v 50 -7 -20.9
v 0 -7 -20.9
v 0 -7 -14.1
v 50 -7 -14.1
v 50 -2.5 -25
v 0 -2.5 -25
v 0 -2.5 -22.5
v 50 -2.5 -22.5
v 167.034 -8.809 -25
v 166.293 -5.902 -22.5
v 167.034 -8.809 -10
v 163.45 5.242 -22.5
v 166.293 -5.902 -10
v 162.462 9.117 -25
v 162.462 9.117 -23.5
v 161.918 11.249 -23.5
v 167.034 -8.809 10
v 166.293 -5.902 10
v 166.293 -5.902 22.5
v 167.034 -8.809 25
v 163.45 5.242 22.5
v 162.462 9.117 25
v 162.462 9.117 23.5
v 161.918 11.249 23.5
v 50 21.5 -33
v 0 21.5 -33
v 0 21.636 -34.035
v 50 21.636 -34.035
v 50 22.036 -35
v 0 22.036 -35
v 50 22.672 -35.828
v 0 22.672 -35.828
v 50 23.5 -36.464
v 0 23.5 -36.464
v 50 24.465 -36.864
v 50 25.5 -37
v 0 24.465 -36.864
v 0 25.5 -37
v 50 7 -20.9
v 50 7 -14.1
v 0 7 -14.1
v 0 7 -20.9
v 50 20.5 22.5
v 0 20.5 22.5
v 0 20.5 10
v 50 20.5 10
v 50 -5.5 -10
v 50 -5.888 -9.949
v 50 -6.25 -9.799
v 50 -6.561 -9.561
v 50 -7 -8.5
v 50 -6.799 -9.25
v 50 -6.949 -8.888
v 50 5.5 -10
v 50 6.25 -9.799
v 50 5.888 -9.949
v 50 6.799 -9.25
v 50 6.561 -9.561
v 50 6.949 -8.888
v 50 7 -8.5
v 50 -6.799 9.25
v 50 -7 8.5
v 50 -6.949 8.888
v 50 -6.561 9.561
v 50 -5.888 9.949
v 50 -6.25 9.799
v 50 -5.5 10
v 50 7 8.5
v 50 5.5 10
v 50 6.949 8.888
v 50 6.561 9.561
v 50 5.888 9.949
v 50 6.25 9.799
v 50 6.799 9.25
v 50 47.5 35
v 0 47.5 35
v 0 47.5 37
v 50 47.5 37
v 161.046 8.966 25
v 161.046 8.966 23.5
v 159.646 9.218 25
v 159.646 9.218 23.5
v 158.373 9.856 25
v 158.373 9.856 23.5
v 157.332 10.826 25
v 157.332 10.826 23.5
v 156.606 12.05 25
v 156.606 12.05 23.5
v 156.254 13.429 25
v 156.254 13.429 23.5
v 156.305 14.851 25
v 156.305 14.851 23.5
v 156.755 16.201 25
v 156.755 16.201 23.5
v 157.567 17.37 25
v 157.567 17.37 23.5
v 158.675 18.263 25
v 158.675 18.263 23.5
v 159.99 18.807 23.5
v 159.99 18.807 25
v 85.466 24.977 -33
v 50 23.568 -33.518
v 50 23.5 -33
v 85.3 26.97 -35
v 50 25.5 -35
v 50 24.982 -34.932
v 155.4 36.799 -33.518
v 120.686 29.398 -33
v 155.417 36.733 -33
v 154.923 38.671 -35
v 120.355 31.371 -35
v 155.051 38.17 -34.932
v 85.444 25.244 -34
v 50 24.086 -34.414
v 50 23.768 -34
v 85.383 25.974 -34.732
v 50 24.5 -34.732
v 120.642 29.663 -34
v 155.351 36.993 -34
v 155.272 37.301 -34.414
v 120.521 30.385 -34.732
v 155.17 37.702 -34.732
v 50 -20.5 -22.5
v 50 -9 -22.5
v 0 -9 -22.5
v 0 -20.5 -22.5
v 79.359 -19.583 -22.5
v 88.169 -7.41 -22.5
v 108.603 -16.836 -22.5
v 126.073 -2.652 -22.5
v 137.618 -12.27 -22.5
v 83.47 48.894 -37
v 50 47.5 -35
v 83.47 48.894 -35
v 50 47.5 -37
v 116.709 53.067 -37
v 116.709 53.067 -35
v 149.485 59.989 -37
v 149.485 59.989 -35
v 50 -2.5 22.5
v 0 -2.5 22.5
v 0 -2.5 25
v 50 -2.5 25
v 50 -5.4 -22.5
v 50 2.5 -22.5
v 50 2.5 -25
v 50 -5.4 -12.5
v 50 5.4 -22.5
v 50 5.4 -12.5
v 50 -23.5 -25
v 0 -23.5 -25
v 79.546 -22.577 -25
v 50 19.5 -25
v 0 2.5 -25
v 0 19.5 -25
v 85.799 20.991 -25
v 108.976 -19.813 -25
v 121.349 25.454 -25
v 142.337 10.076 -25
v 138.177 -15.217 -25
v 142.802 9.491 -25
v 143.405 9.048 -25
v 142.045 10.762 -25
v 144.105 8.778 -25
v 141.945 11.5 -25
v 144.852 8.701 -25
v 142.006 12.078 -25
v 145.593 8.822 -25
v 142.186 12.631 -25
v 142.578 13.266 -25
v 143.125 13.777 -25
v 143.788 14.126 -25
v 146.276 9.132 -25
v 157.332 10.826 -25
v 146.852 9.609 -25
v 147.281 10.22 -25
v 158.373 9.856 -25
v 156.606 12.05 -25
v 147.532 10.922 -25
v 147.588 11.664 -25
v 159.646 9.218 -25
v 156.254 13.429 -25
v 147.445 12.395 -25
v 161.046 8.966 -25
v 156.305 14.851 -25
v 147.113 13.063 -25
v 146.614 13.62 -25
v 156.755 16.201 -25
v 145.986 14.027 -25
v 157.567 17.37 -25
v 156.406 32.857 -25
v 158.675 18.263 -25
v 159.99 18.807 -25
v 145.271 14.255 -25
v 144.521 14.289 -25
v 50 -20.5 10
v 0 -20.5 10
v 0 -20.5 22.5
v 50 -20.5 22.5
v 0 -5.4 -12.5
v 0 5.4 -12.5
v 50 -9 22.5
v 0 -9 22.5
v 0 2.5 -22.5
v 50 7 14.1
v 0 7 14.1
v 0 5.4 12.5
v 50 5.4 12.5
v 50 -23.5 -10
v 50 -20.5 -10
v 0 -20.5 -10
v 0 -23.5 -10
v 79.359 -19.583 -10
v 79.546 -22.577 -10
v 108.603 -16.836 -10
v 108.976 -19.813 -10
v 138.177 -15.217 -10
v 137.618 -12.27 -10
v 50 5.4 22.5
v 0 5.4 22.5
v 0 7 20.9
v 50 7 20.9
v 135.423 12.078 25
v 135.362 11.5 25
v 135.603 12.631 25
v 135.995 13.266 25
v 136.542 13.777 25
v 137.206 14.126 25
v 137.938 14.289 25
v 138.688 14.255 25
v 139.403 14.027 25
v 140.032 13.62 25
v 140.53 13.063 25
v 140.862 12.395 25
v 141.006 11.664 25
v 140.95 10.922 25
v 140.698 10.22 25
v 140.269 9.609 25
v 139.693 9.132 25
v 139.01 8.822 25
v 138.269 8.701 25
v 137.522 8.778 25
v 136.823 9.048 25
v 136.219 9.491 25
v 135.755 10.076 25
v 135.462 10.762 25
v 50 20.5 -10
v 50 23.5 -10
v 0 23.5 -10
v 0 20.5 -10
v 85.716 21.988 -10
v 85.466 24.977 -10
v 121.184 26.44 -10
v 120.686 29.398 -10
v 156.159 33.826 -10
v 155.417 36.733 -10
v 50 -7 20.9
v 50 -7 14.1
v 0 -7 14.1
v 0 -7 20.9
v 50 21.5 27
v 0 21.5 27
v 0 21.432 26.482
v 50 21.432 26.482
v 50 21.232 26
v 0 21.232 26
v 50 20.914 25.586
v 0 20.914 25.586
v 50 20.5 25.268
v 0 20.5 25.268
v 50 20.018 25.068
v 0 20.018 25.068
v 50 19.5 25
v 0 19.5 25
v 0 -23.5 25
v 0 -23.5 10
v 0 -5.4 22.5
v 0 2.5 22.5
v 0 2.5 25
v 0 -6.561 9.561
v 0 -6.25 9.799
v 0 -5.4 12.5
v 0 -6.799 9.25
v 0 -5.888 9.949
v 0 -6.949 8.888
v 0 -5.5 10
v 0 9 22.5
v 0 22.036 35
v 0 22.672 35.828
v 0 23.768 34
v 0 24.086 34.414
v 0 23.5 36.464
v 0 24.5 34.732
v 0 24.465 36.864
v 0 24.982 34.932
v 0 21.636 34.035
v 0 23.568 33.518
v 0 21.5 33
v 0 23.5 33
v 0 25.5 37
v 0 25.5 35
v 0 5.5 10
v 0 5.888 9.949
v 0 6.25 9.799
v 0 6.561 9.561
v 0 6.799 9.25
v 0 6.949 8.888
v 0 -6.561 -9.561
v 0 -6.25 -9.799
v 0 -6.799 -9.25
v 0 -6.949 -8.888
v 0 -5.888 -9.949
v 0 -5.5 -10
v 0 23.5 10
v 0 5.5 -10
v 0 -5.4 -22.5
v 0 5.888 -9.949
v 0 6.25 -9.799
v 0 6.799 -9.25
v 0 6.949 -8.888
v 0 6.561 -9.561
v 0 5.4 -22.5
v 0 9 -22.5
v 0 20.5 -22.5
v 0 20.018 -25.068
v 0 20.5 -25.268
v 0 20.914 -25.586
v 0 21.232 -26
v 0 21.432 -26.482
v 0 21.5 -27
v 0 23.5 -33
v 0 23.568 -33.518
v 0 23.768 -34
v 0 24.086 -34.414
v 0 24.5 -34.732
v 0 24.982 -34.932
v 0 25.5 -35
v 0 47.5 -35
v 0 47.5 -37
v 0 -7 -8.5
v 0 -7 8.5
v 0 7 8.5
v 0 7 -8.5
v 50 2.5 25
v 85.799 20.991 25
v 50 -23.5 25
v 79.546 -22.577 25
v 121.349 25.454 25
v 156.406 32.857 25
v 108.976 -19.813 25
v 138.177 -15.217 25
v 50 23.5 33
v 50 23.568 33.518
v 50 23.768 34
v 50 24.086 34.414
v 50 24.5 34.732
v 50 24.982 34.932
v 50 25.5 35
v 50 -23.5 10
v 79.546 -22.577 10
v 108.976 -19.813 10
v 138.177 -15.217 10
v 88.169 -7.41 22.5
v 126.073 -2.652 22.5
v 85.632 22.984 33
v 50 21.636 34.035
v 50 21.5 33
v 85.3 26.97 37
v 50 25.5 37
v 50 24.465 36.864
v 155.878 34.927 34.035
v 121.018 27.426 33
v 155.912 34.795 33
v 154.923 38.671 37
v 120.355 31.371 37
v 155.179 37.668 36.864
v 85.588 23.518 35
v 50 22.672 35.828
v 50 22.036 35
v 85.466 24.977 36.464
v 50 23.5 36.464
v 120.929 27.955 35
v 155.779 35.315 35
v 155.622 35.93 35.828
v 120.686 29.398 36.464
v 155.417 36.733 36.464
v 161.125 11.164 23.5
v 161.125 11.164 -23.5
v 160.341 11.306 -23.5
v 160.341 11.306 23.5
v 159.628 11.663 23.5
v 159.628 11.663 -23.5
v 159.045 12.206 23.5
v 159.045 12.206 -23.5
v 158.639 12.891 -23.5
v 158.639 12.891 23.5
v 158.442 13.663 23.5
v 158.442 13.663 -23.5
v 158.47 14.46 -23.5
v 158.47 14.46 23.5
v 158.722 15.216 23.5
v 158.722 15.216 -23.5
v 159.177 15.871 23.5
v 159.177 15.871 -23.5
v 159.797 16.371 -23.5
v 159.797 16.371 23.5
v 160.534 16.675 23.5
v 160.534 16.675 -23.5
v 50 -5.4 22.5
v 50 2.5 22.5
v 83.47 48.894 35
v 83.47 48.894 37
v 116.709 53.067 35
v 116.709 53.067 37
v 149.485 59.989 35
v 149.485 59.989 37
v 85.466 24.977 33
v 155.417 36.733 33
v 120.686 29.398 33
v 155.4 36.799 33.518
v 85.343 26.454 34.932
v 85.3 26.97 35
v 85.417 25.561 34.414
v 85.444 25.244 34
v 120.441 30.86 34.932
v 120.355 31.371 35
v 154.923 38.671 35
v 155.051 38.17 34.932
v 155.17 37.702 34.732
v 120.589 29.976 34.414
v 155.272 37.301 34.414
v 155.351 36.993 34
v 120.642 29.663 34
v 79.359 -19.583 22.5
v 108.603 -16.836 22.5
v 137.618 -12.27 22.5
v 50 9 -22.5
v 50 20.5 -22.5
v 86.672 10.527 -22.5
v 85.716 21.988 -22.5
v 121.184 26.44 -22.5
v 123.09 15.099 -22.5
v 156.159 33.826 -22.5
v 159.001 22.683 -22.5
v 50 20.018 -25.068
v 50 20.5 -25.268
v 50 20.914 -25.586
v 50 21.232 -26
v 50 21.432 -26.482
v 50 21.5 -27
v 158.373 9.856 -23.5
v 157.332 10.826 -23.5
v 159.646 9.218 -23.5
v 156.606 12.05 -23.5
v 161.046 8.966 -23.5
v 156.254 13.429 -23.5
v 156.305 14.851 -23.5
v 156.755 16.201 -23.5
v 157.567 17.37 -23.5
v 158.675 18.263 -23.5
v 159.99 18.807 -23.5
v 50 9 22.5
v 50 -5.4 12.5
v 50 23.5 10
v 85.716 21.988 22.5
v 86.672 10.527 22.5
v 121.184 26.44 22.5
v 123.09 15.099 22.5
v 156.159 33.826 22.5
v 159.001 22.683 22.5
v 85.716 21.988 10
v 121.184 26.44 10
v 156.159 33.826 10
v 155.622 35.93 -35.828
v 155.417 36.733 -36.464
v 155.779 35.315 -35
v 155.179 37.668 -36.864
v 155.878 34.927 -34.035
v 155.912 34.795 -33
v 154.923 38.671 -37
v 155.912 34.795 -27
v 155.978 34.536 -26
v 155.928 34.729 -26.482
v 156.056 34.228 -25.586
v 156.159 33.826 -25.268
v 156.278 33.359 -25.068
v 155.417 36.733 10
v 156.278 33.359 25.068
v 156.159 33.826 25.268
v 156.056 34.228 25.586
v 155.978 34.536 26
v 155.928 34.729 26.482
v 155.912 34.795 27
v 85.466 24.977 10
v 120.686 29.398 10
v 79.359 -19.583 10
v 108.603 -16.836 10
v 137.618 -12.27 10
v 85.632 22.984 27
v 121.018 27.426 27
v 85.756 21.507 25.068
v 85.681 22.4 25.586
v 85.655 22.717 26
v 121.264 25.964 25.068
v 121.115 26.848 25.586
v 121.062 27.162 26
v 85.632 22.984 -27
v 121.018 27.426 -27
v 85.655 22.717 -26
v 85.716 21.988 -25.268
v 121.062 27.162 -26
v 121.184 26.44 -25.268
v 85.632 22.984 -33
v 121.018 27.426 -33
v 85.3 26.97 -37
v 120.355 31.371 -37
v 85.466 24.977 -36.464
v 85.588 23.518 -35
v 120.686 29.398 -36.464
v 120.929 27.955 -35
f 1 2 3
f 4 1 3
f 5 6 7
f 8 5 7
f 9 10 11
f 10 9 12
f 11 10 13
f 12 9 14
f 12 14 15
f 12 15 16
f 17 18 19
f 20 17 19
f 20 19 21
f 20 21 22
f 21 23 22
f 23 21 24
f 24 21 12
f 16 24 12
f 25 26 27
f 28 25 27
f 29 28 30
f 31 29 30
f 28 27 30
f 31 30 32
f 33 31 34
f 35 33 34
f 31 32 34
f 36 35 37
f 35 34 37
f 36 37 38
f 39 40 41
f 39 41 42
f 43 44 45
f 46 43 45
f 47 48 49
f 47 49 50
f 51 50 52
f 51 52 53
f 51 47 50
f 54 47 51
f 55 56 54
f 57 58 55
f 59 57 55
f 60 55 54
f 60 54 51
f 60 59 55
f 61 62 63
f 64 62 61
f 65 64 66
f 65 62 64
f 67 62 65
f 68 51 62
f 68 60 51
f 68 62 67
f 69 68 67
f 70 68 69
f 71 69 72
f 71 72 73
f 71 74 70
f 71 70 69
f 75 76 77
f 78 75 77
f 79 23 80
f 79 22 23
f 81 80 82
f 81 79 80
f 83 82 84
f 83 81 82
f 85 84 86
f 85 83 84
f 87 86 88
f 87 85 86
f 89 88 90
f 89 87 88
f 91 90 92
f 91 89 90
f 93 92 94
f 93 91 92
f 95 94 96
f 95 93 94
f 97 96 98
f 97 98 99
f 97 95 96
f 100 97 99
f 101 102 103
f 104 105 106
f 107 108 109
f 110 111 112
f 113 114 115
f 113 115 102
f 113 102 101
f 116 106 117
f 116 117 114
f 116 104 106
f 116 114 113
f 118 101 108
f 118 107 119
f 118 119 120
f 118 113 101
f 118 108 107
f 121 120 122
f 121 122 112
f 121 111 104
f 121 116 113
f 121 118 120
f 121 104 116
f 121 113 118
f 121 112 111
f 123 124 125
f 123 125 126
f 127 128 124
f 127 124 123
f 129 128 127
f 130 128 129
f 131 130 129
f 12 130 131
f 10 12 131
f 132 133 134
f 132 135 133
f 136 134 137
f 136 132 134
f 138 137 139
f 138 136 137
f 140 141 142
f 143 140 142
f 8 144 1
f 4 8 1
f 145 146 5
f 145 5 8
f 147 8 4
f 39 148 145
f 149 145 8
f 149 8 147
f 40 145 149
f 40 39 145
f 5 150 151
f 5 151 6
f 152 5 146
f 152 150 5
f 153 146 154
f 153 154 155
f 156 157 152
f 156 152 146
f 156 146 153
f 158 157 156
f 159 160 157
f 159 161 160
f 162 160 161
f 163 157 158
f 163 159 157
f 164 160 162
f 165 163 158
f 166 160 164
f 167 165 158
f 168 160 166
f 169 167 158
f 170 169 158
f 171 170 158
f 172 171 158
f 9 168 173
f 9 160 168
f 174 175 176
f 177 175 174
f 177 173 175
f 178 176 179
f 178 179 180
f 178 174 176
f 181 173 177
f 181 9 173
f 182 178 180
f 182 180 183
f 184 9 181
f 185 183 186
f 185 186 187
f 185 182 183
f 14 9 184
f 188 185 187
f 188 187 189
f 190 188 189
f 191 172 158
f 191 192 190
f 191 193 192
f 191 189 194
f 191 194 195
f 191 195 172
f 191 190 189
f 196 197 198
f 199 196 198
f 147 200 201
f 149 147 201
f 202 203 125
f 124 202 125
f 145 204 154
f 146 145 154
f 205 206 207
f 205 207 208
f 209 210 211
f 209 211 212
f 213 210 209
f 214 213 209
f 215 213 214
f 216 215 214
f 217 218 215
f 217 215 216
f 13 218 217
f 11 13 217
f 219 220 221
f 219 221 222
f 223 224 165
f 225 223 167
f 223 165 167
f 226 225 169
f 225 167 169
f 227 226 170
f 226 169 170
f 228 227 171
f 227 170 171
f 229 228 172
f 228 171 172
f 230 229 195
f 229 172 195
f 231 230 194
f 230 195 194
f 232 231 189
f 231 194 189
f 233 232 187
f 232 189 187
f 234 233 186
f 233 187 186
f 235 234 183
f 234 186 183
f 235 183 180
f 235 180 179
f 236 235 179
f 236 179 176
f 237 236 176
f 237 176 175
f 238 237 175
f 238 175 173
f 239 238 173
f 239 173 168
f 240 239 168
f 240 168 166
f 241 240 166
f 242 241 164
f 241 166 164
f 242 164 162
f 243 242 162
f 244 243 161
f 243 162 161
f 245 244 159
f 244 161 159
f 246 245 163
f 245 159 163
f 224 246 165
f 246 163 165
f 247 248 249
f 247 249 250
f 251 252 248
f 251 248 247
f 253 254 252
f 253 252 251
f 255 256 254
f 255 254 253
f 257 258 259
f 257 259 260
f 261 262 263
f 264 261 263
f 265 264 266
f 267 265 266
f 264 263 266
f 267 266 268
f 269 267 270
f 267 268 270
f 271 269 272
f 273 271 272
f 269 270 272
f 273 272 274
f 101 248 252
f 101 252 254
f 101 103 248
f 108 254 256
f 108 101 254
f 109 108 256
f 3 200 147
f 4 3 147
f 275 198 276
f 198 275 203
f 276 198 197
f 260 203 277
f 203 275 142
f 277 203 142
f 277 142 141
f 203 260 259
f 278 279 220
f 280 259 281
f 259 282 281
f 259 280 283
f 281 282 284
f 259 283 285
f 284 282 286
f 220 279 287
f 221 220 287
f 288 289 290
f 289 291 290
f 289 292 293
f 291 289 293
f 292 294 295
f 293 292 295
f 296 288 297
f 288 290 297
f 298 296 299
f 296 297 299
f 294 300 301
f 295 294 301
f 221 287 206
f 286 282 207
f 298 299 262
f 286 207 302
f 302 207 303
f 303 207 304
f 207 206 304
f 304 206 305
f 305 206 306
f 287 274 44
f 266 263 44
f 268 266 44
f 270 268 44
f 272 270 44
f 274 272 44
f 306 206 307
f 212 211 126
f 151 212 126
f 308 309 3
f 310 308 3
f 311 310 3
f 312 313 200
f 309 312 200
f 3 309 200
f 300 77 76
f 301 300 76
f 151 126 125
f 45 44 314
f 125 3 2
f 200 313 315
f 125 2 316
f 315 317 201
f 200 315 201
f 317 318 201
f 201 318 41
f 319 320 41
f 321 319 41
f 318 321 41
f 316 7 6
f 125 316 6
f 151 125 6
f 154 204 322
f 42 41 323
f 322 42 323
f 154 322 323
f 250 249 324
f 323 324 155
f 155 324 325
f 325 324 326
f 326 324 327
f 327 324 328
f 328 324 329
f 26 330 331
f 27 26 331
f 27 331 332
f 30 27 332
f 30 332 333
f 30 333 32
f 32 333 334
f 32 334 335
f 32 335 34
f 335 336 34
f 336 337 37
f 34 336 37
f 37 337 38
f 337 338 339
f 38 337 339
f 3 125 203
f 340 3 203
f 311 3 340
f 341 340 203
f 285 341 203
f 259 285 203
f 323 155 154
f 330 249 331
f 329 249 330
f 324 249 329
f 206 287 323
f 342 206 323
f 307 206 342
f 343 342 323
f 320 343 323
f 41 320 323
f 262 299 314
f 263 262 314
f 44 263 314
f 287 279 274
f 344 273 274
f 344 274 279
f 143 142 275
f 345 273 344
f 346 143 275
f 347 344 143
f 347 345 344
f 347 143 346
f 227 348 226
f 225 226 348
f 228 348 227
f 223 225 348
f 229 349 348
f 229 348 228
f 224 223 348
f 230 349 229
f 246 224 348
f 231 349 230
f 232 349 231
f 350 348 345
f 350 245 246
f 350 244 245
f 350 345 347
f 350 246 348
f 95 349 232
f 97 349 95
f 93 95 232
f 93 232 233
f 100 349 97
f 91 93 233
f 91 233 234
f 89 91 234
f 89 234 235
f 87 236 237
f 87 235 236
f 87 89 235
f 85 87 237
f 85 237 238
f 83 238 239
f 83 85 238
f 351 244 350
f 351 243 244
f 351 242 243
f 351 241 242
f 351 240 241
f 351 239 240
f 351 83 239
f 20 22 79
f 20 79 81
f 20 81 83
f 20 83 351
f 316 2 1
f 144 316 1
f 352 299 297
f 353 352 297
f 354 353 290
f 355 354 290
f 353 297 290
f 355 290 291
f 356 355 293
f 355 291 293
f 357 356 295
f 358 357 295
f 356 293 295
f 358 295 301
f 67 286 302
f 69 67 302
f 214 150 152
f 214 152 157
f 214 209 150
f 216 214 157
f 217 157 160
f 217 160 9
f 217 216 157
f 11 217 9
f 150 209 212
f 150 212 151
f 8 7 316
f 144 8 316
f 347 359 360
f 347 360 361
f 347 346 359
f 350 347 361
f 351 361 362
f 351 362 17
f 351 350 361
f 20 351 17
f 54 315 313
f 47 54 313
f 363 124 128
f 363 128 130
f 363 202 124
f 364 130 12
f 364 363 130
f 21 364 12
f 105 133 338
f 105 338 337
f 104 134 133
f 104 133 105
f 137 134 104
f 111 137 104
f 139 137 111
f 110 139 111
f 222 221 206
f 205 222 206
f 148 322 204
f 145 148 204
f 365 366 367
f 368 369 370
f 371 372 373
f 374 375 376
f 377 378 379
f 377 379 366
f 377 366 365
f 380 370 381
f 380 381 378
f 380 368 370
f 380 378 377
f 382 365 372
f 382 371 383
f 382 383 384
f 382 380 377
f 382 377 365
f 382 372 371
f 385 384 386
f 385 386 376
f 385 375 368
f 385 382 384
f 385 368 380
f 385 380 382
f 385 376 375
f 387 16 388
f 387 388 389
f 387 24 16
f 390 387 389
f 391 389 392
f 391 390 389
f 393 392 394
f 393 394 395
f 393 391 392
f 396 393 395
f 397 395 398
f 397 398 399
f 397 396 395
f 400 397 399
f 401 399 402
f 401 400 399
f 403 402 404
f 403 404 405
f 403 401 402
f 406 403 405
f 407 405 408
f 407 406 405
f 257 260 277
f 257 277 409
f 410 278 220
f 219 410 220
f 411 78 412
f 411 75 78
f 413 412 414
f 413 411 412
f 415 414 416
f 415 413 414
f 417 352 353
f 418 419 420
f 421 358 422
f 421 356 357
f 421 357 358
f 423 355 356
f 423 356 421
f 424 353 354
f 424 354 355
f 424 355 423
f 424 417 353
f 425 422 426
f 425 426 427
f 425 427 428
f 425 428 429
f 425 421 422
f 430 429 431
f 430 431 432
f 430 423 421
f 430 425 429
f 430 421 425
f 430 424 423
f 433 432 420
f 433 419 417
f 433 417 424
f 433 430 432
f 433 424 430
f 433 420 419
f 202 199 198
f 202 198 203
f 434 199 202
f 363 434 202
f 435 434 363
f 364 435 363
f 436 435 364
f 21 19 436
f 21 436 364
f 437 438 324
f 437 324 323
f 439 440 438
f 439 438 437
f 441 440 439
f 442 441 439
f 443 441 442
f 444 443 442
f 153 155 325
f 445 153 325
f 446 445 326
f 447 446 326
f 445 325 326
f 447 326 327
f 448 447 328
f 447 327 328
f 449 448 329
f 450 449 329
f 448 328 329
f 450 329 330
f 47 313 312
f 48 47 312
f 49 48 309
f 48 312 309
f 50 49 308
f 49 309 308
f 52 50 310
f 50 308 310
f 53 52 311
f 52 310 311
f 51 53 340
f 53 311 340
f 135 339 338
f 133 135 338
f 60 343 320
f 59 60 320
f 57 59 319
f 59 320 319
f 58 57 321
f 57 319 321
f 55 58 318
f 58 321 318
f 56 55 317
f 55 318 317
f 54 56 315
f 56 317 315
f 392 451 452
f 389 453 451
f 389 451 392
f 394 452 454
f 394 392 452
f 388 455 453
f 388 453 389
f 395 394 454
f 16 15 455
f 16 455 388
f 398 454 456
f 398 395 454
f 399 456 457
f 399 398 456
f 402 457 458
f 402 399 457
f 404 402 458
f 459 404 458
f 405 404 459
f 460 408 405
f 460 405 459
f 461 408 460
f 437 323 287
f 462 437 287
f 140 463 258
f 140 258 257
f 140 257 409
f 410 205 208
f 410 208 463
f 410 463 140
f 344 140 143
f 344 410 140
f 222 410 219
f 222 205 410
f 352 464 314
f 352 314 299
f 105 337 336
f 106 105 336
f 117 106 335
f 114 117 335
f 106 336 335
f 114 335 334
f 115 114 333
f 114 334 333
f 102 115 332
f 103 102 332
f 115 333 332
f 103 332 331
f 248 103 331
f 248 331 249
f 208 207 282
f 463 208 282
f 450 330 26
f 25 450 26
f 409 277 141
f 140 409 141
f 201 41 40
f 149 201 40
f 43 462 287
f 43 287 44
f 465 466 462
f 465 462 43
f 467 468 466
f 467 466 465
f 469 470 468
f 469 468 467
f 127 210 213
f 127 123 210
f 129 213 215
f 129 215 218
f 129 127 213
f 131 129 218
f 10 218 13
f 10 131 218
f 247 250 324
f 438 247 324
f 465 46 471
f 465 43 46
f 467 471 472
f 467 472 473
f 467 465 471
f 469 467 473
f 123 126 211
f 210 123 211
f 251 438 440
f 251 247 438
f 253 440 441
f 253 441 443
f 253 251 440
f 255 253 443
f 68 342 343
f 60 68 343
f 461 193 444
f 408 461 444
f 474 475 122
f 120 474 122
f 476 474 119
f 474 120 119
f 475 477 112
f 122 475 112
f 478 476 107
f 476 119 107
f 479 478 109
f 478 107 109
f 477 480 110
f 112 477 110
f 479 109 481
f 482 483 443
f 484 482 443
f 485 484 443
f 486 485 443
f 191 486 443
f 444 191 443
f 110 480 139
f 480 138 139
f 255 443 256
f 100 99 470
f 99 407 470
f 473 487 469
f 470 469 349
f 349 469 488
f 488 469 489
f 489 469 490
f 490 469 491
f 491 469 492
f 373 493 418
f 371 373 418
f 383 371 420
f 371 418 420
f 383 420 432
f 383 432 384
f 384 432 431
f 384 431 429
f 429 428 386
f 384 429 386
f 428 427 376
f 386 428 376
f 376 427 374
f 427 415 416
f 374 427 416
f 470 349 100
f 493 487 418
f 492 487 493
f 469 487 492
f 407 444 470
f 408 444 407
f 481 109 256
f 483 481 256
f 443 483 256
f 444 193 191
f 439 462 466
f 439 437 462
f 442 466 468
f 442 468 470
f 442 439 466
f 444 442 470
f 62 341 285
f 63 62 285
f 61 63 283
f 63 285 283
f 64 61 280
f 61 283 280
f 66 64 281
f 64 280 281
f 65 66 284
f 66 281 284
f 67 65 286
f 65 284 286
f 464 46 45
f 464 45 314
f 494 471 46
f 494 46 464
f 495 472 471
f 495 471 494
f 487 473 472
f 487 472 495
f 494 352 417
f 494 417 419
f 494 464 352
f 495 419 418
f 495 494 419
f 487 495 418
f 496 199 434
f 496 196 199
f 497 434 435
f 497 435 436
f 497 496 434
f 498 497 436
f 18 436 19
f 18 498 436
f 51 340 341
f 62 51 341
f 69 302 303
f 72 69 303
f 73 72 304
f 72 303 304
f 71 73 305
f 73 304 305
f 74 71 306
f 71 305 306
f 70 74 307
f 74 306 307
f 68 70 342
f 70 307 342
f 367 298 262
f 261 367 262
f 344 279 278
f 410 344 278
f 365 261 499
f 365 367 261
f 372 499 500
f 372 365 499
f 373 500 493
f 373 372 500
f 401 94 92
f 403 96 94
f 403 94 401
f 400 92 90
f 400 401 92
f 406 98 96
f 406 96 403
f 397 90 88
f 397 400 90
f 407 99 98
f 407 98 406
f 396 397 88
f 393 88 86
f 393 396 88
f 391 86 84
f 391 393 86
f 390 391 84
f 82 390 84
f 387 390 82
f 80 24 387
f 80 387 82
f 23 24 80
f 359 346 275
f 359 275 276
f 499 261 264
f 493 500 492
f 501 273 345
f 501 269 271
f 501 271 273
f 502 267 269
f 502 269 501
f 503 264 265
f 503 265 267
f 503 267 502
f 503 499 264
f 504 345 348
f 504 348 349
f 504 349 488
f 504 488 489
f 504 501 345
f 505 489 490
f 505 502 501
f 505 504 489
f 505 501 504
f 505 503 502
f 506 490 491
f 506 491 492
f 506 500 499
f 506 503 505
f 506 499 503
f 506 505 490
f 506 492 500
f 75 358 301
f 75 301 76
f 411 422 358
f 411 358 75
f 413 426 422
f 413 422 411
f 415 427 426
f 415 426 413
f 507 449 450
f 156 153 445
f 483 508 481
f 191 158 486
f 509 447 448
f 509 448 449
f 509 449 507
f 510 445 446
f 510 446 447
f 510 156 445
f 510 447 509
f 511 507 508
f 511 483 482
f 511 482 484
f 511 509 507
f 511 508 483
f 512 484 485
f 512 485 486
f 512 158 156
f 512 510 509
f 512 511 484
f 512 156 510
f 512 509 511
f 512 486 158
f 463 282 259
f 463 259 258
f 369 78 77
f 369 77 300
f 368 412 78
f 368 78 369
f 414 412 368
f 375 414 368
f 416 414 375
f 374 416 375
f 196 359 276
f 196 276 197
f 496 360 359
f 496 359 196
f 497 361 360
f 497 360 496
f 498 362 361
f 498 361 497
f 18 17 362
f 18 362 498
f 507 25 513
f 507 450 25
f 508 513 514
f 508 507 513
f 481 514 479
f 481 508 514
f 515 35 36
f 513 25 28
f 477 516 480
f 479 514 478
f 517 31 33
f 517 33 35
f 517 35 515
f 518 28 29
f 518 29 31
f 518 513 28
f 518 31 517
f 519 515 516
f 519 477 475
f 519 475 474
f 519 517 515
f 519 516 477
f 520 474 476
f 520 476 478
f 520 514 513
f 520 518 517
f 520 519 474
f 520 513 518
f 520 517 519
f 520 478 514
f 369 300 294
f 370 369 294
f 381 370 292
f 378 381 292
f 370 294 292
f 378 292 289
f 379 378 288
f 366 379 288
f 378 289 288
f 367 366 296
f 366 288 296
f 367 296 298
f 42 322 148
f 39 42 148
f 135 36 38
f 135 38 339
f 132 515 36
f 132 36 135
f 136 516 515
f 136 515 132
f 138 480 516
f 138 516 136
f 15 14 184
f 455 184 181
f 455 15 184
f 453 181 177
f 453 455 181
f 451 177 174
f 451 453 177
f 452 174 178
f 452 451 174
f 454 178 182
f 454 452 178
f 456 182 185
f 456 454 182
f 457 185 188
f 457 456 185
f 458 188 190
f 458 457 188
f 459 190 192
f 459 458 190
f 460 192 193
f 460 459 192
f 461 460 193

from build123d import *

# Parameters (mm, degrees)
ESTRUSIONE_ESTRUSIONE1_DEPTH = 50
SMUSSO1_SIZE                 = 1.6
RIVOLUZIONE1_ANGLE           = 14.31
FORO_PER_VITE_M5_2_D         = 5.6
FORO_PER_VITE_M5_2_DEPTH     = 120
FORO_PER_VITE_M5_2_TIP       = 1.682409733


with BuildPart() as part:
    # Schizzo1 → Estrusione-Estrusione1 (new body)
    with BuildSketch(Plane(origin=(0, 0, 0), x_dir=(0, 0, -1), z_dir=(1, 0, 0))):
        with BuildLine():
            Line((-10, -23.5), (-10, -20.5))
            Line((-10, -20.5), (-22.5, -20.5))
            Line((-22.5, -20.5), (-22.5, -9))
            Line((-22.5, -9), (22.5, -9))
            Line((22.5, -9), (22.5, -20.5))
            Line((22.5, -20.5), (10, -20.5))
            Line((10, -20.5), (10, -23.5))
            Line((10, -23.5), (25, -23.5))
            Line((25, -23.5), (25, -2.5))
            Line((25, -2.5), (22.5, -2.5))
            Line((22.5, -2.5), (22.5, -7))
            Line((22.5, -7), (12.5, -7))
            Line((12.5, -7), (12.5, 7))
            Line((12.5, 7), (22.5, 7))
            Line((22.5, 7), (22.5, 2.5))
            Line((22.5, 2.5), (25, 2.5))
            Line((25, 2.5), (25, 19.5))
            ThreePointArc((25, 19.5), (25.585786438, 20.914213562), (27, 21.5))
            Line((27, 21.5), (33, 21.5))
            ThreePointArc((33, 21.5), (35.828427125, 22.671572875), (37, 25.5))
            Line((37, 25.5), (37, 47.5))
            Line((37, 47.5), (35, 47.5))
            Line((35, 47.5), (35, 25.5))
            ThreePointArc((35, 25.5), (34.414213562, 24.085786438), (33, 23.5))
            Line((33, 23.5), (10, 23.5))
            Line((10, 23.5), (10, 20.5))
            Line((10, 20.5), (22.5, 20.5))
            Line((22.5, 20.5), (22.5, 9))
            Line((22.5, 9), (-22.5, 9))
            Line((-22.5, 9), (-22.5, 20.5))
            Line((-22.5, 20.5), (-10, 20.5))
            Line((-10, 20.5), (-10, 23.5))
            Line((-10, 23.5), (-33, 23.5))
            ThreePointArc((-33, 23.5), (-34.414213562, 24.085786438), (-35, 25.5))
            Line((-35, 25.5), (-35, 47.5))
            Line((-35, 47.5), (-37, 47.5))
            Line((-37, 47.5), (-37, 25.5))
            ThreePointArc((-37, 25.5), (-35.828427125, 22.671572875), (-33, 21.5))
            Line((-33, 21.5), (-27, 21.5))
            ThreePointArc((-27, 21.5), (-25.585786438, 20.914213562), (-25, 19.5))
            Line((-25, 19.5), (-25, 2.5))
            Line((-25, 2.5), (-22.5, 2.5))
            Line((-22.5, 2.5), (-22.5, 7))
            Line((-22.5, 7), (-12.5, 7))
            Line((-12.5, 7), (-12.5, -7))
            Line((-12.5, -7), (-22.5, -7))
            Line((-22.5, -7), (-22.5, -2.5))
            Line((-22.5, -2.5), (-25, -2.5))
            Line((-25, -2.5), (-25, -23.5))
            Line((-25, -23.5), (-10, -23.5))
        make_face()
        with BuildLine():
            Line((-8.5, 7), (8.5, 7))
            ThreePointArc((8.5, 7), (9.560660172, 6.560660172), (10, 5.5))
            Line((10, 5.5), (10, -5.5))
            ThreePointArc((10, -5.5), (9.560660172, -6.560660172), (8.5, -7))
            Line((8.5, -7), (-8.5, -7))
            ThreePointArc((-8.5, -7), (-9.560660172, -6.560660172), (-10, -5.5))
            Line((-10, -5.5), (-10, 5.5))
            ThreePointArc((-10, 5.5), (-9.560660172, 6.560660172), (-8.5, 7))
        make_face(mode=Mode.SUBTRACT)
    extrude(amount=ESTRUSIONE_ESTRUSIONE1_DEPTH)

    # Smusso1
    smusso1_edges = [part.edges().sort_by_distance(p)[0] for p in [
        (25, -7, 22.5),
        (25, -7, 12.5),
        (25, 7, 12.5),
        (25, 7, 22.5),
        (25, 7, -22.5),
        (25, 7, -12.5),
        (25, -7, -12.5),
        (25, -7, -22.5),
    ]]
    chamfer(smusso1_edges, length=SMUSSO1_SIZE)

    # Schizzo2 → Rivoluzione1 (revolve)
    with BuildSketch(Plane(origin=(50, 0, 0), x_dir=(0, 0, -1), z_dir=(1, 0, 0))):
        with BuildLine():
            Line((-10, -23.5), (-25, -23.5))
            Line((-25, -23.5), (-25, 19.5))
            ThreePointArc((-25, 19.5), (-25.585786438, 20.914213562), (-27, 21.5))
            Line((-27, 21.5), (-33, 21.5))
            ThreePointArc((-33, 21.5), (-35.828427125, 22.671572875), (-37, 25.5))
            Line((-37, 25.5), (-37, 47.5))
            Line((-37, 47.5), (-35, 47.5))
            Line((-35, 47.5), (-35, 25.5))
            ThreePointArc((-35, 25.5), (-34.414213562, 24.085786438), (-33, 23.5))
            Line((-33, 23.5), (-10, 23.5))
            Line((-10, 23.5), (-10, 20.5))
            Line((-10, 20.5), (-22.5, 20.5))
            Line((-22.5, 20.5), (-22.5, 9))
            Line((-22.5, 9), (22.5, 9))
            Line((22.5, 9), (22.5, 20.5))
            Line((22.5, 20.5), (10, 20.5))
            Line((10, 20.5), (10, 23.5))
            Line((10, 23.5), (33, 23.5))
            ThreePointArc((33, 23.5), (34.414213562, 24.085786438), (35, 25.5))
            Line((35, 25.5), (35, 47.5))
            Line((35, 47.5), (37, 47.5))
            Line((37, 47.5), (37, 25.5))
            ThreePointArc((37, 25.5), (35.828427125, 22.671572875), (33, 21.5))
            Line((33, 21.5), (27, 21.5))
            ThreePointArc((27, 21.5), (25.585786438, 20.914213562), (25, 19.5))
            Line((25, 19.5), (25, -23.5))
            Line((25, -23.5), (10, -23.5))
            Line((10, -23.5), (10, -20.5))
            Line((10, -20.5), (22.5, -20.5))
            Line((22.5, -20.5), (22.5, -9))
            Line((22.5, -9), (-22.5, -9))
            Line((-22.5, -9), (-22.5, -20.5))
            Line((-22.5, -20.5), (-10, -20.5))
            Line((-10, -20.5), (-10, -23.5))
        make_face()
    revolve(axis=Axis((50, 450, 89.886149412), (0, 0, 1)), revolution_arc=RIVOLUZIONE1_ANGLE)

    # Schizzo18 → Taglia-Rivoluzione1 (revolve, cut)
    with BuildSketch(Plane(origin=(154.720013769, 39.4663965, 0), x_dir=(0, 0, -1), z_dir=(0.9689726071879229, 0.24716813411004152, 0))):
        Polygon((-25, -26.320733471), (25, -26.320733471), (25, -21.320733471), (23.5, -21.320733471), (23.5, -23.520733471), (-23.5, -23.520733471), (-23.5, -21.320733471), (-25, -21.320733471), align=None)
    revolve(axis=Axis((161.22566035, 13.962326765, 25), (0, 0, -1)), mode=Mode.SUBTRACT)

    # Foro per Vite M5-2
    with Locations(Plane(origin=(-8.832087888, 0, 67.086367898), x_dir=(0.9914448613738102, 0, 0.13052619222005385), z_dir=(-0.13052619222005385, 0, 0.9914448613738102))):
        with Locations((140.267423642, 11.500002666)):
            Hole(FORO_PER_VITE_M5_2_D / 2, depth=FORO_PER_VITE_M5_2_DEPTH)
            with Locations((0, 0, -(FORO_PER_VITE_M5_2_DEPTH + FORO_PER_VITE_M5_2_TIP / 2))):  # 118° drill point
                Cone(0, FORO_PER_VITE_M5_2_D / 2, FORO_PER_VITE_M5_2_TIP, mode=Mode.SUBTRACT)


solid = part.part
